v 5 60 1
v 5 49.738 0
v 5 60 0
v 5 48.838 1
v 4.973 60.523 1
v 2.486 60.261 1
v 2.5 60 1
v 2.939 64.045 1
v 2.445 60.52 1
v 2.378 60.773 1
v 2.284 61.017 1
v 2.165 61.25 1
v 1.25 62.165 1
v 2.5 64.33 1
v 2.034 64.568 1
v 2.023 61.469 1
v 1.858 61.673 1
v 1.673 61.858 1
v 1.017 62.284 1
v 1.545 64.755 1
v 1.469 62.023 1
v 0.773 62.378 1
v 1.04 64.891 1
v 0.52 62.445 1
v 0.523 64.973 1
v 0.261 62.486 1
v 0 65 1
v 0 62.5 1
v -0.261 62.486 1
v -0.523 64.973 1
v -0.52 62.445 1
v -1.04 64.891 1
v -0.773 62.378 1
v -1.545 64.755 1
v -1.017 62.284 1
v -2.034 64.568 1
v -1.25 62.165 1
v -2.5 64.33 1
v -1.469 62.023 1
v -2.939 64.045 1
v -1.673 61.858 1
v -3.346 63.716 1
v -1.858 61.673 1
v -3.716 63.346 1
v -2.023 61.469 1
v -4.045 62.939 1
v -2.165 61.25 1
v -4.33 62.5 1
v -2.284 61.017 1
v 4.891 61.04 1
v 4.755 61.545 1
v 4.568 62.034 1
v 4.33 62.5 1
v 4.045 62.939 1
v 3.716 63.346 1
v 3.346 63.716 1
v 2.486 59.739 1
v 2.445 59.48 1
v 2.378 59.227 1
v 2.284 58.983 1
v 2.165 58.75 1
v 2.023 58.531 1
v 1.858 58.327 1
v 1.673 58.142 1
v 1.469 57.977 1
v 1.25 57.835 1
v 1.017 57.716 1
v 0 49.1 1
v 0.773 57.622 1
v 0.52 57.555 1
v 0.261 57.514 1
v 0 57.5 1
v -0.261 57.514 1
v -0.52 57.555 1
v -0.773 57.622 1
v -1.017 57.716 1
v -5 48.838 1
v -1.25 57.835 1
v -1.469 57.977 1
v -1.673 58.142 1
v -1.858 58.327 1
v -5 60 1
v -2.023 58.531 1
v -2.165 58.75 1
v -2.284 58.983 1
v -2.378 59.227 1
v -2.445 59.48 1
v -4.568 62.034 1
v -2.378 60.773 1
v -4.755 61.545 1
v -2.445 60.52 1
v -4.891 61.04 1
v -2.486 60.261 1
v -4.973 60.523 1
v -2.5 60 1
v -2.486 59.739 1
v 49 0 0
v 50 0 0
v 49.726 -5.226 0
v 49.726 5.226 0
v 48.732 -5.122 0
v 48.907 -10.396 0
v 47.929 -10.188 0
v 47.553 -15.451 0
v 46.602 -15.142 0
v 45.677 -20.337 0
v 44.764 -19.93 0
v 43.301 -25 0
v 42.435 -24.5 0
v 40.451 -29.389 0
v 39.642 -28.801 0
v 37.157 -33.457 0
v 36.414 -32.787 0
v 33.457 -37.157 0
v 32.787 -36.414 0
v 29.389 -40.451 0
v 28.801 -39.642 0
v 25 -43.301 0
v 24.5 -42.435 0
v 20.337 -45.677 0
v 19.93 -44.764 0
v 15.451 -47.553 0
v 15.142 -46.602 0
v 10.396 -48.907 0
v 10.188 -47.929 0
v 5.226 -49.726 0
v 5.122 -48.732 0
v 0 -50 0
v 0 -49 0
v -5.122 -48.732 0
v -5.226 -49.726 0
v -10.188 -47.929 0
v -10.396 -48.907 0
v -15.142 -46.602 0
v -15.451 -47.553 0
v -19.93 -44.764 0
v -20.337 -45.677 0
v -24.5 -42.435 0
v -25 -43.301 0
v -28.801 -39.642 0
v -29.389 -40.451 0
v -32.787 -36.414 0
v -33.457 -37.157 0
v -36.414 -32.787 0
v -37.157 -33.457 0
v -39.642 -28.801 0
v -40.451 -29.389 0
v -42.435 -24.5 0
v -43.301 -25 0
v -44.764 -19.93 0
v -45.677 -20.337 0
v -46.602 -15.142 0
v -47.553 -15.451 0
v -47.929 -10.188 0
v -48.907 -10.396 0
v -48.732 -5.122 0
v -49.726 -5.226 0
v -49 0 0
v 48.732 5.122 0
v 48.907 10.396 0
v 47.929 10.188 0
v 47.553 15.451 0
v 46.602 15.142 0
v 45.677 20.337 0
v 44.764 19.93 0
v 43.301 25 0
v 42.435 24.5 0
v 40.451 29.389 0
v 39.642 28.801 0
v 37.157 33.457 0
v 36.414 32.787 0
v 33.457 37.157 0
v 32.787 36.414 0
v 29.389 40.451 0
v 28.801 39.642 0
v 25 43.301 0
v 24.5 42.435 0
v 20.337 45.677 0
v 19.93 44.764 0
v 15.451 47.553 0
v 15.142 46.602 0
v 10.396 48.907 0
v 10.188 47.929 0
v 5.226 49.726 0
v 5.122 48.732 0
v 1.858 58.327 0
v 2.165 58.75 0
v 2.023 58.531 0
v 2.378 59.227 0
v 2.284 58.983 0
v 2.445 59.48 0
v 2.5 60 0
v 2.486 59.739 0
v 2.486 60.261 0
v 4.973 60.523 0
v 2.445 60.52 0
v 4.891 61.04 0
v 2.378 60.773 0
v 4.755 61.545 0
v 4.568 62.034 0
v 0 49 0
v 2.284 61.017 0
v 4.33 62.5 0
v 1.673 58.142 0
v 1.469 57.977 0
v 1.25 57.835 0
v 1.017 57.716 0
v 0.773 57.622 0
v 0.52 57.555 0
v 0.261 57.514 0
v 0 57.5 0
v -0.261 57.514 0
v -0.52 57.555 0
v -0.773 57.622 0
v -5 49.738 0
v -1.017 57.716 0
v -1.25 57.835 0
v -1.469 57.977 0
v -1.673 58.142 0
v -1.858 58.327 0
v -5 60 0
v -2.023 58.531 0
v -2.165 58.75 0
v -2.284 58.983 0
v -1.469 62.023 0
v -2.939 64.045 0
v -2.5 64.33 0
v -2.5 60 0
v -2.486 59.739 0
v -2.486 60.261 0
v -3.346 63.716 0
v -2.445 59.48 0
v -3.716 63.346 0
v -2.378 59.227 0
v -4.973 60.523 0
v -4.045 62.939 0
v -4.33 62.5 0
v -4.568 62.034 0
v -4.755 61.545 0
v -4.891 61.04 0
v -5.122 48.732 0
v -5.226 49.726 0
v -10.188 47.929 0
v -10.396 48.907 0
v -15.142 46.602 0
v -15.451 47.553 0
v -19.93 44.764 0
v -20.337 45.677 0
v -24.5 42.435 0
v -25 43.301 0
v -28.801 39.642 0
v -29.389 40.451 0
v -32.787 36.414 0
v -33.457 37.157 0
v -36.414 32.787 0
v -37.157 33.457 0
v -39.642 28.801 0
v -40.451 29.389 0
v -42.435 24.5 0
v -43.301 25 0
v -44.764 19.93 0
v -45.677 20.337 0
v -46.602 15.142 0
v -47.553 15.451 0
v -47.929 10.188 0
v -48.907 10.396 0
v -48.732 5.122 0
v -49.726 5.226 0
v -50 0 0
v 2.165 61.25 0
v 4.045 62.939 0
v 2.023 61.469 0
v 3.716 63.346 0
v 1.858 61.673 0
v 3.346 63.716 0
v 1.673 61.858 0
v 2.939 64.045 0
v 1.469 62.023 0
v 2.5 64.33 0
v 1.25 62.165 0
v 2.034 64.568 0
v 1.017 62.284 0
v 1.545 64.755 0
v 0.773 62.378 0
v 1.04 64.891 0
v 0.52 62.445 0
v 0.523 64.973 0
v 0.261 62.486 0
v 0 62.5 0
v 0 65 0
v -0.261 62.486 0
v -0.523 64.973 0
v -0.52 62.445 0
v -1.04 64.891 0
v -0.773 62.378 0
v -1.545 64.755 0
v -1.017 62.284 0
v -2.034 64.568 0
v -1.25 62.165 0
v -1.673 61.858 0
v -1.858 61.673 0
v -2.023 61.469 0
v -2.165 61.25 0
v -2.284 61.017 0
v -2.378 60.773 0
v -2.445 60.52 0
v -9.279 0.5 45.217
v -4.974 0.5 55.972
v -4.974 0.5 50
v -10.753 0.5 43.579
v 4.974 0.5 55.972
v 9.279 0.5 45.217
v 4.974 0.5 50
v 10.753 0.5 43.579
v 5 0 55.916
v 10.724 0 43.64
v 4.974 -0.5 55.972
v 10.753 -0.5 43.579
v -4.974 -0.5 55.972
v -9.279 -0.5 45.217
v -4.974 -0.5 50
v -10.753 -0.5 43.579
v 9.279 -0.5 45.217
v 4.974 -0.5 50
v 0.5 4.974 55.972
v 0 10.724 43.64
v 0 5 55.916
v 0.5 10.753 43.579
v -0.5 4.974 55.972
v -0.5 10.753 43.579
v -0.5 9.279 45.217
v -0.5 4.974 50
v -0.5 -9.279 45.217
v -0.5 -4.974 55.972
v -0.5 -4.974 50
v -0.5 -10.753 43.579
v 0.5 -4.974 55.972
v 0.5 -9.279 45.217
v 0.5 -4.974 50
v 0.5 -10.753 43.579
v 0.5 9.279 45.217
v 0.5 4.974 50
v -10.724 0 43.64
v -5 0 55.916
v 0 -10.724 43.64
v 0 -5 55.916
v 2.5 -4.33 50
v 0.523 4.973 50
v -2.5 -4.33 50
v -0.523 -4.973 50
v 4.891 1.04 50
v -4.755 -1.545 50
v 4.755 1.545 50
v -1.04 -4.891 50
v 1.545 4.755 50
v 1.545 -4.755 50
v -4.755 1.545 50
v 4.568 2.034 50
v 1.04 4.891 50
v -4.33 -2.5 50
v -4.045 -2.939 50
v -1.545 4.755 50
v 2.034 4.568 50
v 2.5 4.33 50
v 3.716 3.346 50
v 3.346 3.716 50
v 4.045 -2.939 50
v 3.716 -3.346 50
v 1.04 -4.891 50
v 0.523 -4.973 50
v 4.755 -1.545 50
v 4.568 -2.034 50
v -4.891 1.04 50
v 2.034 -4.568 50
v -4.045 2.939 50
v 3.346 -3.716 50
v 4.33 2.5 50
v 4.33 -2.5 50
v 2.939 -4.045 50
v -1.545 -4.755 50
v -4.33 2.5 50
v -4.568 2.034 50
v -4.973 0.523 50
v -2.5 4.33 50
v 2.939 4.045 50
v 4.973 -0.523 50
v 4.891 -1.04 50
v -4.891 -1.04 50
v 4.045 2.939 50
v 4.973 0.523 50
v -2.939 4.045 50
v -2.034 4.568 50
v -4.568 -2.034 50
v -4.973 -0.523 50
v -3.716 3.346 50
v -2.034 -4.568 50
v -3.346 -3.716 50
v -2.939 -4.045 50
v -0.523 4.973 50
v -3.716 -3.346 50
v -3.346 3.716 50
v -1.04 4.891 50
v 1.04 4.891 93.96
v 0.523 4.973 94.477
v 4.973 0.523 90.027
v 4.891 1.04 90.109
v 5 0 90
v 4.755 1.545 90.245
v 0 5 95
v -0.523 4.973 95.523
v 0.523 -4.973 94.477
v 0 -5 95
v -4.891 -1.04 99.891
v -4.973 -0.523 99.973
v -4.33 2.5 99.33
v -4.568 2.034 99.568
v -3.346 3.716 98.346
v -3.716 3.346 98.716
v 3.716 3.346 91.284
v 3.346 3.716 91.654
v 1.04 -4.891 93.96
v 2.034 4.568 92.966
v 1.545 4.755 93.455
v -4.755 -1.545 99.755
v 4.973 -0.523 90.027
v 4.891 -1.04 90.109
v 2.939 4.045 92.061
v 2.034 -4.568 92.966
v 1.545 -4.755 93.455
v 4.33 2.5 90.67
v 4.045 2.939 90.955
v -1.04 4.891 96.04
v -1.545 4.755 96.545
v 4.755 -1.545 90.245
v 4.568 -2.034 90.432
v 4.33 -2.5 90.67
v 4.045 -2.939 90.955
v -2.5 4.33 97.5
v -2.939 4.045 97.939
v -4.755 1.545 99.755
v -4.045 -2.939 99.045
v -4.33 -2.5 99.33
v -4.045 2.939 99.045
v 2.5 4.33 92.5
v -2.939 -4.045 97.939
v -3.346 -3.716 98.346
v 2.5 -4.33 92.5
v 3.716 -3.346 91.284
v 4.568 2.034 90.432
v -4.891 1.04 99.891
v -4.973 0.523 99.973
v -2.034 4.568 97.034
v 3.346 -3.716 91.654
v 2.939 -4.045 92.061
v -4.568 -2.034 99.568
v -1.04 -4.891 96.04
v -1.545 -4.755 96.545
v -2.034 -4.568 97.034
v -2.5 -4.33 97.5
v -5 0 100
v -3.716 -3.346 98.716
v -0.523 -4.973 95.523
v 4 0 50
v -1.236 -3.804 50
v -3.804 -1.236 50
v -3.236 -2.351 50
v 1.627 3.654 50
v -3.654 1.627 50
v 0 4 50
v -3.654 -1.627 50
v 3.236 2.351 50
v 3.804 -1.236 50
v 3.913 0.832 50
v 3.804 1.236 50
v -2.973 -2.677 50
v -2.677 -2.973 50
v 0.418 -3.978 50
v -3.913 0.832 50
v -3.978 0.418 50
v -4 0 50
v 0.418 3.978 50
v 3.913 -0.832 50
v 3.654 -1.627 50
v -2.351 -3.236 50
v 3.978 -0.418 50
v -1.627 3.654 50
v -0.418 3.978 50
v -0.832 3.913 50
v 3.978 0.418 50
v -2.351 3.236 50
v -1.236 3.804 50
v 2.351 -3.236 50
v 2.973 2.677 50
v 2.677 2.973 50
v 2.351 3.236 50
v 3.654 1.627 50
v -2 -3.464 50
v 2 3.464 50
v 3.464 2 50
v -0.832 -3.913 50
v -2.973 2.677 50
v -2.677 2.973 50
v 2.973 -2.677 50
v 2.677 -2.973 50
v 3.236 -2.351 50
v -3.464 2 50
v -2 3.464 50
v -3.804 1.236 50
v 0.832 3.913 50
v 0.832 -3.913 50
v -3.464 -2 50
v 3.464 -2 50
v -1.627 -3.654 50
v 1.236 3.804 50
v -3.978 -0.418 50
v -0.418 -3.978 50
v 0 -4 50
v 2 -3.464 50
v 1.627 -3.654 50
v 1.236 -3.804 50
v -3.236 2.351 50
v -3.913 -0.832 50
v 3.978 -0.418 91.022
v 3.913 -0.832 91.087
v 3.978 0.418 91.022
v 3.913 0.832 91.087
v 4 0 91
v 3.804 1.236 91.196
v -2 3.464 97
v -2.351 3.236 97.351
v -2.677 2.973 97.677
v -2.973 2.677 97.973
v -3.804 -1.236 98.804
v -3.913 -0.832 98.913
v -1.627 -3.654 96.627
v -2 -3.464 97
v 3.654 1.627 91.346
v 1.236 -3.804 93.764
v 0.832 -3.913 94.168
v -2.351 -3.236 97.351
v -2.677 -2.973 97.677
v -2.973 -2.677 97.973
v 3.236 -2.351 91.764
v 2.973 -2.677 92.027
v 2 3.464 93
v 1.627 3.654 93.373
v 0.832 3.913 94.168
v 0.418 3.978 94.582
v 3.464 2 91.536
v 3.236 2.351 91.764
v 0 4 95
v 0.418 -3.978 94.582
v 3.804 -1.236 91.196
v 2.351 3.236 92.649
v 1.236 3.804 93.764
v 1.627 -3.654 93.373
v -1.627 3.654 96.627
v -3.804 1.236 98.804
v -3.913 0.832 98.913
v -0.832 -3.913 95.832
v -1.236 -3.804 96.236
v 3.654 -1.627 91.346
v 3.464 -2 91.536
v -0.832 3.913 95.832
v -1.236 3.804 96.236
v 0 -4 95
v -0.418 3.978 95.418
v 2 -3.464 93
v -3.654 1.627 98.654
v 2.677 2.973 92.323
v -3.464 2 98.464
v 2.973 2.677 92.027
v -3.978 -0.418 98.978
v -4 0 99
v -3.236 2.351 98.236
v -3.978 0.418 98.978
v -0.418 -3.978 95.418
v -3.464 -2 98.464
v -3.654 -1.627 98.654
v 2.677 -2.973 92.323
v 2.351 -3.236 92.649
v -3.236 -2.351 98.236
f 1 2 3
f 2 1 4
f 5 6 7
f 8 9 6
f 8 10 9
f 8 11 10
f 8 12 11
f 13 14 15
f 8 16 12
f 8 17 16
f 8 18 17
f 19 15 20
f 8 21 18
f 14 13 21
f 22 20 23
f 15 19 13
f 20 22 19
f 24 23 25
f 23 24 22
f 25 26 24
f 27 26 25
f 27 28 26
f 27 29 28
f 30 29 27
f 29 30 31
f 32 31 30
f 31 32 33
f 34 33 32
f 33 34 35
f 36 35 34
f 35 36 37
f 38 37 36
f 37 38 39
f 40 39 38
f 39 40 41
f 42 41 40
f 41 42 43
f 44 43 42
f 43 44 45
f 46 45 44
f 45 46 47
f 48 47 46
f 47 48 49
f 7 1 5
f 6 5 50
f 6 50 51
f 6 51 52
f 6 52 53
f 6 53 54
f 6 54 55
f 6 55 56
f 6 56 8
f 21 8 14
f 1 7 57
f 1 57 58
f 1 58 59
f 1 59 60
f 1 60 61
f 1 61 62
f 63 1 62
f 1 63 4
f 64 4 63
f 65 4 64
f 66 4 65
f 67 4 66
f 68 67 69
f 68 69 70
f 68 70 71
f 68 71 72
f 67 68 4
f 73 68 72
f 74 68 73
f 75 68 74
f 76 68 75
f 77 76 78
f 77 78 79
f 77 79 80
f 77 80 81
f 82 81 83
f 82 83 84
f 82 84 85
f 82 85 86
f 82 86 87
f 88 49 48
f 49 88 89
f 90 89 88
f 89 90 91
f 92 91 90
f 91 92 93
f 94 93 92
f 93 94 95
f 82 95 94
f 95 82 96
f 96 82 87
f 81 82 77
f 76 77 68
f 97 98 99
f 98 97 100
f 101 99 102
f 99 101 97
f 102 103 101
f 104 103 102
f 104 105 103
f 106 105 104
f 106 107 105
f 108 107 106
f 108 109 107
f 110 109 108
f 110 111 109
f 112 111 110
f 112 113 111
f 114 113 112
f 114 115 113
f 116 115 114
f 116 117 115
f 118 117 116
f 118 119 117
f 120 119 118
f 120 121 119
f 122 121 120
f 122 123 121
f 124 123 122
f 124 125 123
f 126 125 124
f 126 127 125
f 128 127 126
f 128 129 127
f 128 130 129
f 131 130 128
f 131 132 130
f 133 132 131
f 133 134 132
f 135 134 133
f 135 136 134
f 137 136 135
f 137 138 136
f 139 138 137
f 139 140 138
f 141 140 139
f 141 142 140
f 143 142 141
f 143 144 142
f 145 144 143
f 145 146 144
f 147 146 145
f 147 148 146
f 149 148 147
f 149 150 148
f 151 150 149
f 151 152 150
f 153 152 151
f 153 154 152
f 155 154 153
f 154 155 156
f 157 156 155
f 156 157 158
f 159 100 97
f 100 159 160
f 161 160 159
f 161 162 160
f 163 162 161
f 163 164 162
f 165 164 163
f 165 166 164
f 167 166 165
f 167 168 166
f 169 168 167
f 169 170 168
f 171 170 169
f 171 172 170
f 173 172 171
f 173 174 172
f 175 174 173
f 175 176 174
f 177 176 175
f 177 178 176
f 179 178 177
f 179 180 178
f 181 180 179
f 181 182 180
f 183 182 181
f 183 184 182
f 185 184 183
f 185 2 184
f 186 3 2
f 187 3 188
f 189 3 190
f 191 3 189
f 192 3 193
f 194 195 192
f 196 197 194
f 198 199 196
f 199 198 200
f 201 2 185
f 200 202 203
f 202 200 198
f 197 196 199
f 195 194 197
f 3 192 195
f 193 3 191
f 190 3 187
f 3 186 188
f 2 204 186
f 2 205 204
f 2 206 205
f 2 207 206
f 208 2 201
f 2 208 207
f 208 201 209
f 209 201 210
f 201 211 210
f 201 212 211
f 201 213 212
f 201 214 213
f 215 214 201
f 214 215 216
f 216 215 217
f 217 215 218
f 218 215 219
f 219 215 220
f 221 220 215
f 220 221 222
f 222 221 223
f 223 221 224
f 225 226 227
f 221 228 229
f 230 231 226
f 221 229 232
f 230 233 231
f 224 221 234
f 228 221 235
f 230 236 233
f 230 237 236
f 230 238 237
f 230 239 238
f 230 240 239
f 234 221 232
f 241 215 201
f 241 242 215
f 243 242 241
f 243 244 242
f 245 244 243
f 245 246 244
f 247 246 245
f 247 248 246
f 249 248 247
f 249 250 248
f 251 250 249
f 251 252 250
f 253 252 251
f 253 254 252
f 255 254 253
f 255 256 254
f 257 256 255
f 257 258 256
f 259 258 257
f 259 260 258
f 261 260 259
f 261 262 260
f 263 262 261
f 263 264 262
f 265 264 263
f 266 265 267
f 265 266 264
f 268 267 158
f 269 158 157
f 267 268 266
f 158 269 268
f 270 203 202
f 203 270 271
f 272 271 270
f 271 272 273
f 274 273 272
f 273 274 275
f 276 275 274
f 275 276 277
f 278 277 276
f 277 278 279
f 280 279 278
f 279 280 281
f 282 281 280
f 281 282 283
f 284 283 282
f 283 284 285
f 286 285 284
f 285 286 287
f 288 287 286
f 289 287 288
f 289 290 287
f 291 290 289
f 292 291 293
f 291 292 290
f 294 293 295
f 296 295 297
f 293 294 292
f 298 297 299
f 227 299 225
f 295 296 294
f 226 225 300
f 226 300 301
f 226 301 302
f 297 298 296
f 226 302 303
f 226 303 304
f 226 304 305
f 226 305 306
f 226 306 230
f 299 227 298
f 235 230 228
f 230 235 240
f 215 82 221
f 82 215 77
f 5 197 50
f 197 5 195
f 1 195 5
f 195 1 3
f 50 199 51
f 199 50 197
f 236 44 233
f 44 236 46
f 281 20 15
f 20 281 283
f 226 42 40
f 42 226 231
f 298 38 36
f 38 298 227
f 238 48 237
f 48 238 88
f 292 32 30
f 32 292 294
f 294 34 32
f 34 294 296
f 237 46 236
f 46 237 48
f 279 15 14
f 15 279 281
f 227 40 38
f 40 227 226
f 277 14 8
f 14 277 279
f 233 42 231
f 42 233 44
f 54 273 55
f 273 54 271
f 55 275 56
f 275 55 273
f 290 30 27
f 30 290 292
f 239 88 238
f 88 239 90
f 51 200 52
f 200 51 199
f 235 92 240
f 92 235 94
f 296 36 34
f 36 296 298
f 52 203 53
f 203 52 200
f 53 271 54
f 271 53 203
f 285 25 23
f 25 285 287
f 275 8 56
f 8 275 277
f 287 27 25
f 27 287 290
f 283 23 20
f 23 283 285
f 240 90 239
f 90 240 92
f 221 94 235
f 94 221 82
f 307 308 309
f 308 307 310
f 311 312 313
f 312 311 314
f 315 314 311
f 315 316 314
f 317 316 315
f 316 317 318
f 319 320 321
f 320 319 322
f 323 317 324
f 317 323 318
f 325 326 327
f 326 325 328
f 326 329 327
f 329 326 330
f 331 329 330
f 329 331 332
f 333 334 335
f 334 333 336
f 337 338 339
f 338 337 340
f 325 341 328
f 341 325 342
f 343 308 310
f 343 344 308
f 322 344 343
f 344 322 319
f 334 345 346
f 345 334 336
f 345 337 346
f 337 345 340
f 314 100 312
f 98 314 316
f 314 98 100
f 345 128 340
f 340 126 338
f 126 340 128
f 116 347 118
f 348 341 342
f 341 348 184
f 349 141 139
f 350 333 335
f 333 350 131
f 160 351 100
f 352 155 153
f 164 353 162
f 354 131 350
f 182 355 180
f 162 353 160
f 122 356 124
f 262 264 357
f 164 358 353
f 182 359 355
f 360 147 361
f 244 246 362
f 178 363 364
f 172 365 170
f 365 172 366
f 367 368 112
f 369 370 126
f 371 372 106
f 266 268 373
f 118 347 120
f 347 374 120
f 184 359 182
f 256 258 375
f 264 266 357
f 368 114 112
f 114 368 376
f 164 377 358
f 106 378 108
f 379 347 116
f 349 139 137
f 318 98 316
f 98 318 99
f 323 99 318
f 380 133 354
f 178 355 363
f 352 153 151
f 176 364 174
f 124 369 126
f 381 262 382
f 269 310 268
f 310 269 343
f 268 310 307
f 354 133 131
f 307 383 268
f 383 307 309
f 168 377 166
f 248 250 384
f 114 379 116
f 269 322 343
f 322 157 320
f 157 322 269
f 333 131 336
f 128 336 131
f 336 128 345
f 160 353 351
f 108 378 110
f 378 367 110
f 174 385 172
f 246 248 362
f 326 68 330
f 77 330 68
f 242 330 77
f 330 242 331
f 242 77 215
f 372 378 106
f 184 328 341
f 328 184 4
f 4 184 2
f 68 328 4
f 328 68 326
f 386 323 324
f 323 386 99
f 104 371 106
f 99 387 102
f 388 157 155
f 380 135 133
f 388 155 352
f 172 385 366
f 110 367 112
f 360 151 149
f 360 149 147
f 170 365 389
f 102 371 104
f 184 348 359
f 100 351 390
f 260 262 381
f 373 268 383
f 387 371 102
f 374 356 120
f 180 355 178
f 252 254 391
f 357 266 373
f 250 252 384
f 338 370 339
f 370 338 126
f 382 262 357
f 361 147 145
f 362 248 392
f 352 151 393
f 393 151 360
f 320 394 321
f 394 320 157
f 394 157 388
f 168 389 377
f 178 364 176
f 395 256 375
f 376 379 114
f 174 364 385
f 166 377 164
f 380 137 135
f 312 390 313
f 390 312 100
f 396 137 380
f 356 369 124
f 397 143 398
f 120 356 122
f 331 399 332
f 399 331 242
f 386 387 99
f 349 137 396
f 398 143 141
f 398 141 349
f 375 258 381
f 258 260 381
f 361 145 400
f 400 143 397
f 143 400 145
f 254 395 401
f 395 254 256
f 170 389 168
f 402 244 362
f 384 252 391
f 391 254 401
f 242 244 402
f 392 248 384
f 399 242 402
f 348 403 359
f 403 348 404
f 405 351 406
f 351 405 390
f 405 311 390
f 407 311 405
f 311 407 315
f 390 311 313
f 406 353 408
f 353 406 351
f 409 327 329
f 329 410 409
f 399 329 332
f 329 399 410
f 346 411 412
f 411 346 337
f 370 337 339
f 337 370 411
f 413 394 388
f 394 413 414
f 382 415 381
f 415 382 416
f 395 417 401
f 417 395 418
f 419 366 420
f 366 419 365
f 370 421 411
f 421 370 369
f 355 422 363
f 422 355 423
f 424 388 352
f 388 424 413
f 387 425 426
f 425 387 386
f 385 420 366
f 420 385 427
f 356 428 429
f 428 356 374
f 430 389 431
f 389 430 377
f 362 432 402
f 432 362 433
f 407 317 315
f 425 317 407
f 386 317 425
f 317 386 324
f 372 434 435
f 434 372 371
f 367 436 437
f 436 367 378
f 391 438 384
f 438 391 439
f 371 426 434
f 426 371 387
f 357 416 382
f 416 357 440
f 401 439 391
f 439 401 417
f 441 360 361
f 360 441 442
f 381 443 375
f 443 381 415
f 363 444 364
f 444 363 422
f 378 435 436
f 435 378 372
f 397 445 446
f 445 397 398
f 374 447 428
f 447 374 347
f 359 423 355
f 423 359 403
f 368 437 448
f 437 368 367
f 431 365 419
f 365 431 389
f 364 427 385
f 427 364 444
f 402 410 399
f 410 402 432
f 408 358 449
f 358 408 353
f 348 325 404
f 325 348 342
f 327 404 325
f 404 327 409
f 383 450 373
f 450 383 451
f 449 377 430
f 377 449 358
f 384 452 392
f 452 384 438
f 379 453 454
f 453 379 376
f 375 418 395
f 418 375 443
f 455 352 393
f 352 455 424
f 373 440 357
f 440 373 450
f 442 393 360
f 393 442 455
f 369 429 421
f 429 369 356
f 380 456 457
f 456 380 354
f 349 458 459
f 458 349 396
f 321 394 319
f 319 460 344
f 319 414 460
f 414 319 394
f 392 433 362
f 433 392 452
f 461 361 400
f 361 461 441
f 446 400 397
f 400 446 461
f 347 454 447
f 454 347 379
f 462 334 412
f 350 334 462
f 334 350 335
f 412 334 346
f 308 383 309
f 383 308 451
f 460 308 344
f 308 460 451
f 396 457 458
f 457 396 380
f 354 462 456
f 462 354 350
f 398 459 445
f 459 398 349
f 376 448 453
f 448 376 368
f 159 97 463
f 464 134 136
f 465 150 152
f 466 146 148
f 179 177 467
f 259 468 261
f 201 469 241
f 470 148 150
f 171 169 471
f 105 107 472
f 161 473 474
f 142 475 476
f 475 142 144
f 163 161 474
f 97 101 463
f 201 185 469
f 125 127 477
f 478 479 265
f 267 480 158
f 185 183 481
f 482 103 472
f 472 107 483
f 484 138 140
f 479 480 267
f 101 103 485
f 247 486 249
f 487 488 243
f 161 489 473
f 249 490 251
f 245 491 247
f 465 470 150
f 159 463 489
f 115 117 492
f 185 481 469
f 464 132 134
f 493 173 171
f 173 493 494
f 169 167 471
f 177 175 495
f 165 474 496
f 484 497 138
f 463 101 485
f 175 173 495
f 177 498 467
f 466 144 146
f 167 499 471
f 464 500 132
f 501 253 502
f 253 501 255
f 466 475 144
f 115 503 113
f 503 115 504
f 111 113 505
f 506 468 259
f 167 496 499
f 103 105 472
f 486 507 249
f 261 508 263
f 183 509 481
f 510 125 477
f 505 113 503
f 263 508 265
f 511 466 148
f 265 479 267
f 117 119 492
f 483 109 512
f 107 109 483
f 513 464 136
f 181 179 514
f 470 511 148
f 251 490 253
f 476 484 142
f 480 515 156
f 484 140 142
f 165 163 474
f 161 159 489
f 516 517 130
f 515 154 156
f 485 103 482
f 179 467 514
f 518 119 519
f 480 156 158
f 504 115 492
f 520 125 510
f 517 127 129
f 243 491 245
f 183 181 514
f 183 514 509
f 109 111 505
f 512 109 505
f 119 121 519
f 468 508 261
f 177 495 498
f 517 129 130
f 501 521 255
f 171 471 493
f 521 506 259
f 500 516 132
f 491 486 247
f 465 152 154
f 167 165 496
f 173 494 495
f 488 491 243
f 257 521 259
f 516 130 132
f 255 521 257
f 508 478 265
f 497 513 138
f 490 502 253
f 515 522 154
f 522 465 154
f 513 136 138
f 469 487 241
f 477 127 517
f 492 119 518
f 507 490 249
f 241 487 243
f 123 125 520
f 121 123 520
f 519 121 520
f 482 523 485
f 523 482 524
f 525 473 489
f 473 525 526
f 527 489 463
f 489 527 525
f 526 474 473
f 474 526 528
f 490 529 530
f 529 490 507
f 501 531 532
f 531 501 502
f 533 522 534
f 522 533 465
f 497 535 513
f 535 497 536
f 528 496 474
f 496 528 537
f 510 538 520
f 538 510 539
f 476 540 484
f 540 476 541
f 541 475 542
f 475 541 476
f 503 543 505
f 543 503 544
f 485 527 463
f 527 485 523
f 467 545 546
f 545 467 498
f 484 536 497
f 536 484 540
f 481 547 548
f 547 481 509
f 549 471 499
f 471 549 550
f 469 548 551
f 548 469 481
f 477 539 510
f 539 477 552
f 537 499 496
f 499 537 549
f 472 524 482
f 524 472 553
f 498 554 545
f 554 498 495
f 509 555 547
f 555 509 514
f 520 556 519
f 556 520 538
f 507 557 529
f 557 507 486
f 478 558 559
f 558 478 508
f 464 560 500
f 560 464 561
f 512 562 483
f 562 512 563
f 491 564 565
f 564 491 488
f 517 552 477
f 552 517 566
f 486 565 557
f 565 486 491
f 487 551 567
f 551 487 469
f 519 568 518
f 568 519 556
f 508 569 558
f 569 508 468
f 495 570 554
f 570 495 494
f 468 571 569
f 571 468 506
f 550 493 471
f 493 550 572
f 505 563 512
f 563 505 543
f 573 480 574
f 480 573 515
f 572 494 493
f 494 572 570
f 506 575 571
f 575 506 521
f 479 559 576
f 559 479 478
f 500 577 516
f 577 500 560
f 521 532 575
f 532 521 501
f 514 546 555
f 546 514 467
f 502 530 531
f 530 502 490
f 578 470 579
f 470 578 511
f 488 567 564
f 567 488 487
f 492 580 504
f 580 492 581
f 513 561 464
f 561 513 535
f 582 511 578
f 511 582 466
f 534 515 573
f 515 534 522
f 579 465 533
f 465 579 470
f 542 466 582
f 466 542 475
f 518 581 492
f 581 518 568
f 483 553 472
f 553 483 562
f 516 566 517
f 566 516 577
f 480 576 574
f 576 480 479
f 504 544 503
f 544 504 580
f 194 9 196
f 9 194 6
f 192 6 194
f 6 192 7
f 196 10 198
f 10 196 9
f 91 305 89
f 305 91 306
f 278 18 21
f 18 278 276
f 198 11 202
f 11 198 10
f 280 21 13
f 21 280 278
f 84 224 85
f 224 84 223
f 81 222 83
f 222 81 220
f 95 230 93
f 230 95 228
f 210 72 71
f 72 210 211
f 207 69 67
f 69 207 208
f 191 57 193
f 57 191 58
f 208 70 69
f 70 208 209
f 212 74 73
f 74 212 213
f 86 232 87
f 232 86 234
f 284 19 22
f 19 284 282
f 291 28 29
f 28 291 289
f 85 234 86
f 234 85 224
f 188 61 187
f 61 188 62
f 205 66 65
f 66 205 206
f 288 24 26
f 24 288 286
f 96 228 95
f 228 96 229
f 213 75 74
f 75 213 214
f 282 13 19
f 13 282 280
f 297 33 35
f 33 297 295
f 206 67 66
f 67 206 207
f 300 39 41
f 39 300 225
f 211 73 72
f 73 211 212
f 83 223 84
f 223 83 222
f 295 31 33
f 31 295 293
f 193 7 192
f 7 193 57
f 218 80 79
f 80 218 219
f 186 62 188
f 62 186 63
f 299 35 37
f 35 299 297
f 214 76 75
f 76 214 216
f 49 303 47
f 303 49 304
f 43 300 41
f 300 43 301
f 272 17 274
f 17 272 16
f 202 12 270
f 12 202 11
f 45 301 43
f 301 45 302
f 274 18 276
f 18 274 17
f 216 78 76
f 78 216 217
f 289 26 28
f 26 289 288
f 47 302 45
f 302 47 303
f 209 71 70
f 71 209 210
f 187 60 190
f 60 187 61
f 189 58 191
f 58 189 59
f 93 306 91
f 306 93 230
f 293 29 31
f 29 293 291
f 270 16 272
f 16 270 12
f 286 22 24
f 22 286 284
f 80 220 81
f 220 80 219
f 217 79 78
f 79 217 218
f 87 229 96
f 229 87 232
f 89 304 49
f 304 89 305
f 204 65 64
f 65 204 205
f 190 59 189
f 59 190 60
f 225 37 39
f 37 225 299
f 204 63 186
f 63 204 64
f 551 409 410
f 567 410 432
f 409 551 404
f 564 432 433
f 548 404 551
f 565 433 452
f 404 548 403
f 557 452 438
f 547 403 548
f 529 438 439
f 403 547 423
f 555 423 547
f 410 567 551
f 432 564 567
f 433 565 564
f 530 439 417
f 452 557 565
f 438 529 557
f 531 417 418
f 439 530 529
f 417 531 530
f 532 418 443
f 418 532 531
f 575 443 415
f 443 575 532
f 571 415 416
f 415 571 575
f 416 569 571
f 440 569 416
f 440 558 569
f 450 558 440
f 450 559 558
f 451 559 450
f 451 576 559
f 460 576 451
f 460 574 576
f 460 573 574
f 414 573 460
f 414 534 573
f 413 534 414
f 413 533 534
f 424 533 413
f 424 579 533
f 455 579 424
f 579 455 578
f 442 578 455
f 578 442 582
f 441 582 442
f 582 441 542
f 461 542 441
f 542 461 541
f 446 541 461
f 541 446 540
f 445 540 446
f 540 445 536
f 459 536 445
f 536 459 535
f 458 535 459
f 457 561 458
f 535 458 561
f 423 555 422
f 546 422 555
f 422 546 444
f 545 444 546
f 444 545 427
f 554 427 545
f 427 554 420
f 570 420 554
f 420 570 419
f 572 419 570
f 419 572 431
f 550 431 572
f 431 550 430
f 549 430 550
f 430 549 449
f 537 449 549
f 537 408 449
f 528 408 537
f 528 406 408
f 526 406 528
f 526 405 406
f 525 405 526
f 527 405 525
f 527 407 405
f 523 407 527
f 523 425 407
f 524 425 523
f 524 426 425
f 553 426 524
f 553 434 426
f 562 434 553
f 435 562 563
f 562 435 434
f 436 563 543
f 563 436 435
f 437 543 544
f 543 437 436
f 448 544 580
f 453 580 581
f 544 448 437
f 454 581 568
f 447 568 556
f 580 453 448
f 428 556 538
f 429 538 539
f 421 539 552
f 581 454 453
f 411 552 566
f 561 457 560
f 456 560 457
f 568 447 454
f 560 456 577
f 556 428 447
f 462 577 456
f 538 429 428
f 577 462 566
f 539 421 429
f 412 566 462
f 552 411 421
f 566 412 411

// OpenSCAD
/* [Funnel] */

fine = 60; // [20:100]
show_Hanger = "yes"; // [yes,no]
show_Gab = "yes"; // [yes,no]
WallThickness = 1; // [1:3]

// Which one would you like to see?




HighFunnel =50; // [30:150]
DiameterTop = 100; // [40:150]



DiameterPipe = 10; // [6:20]
HighPipe =50; // [30:80]
BeveledTip = "yes"; // [yes,no]

// ignore variable values

/* [Hidden] */
Spitze = 45;

$fn = fine;
Hoehe = (HighPipe + HighFunnel) / 2;
Ghoehe = (HighPipe + HighFunnel);
ra2 = DiameterPipe/2;

schr=ra2*5;

ra1 = DiameterTop;
Wand = WallThickness;

Hy = (ra2*2)/cos(Spitze);
LuftW = 110 - atan((ra1/2)/HighFunnel);
echo (LuftW);

difference()
{
union() {
//Trichter    
    translate([0,0,HighFunnel/2])
    cylinder(r1=ra1/2,r2=ra2,h=HighFunnel, center = true);

//Lasche
if (show_Hanger=="yes"){    
    translate([0,ra1/2,Wand/2])
    cube(size = [ra1/10,ra1/5,Wand], center = true);    
    translate([0,ra1/2+ra1/10,Wand/2])
    cylinder(r=ra1/20,h=Wand, center = true); 
} 

//Rohr 

    translate([0,0,Ghoehe-(HighPipe/2)])
    cylinder(r=ra2,h=HighPipe, center = true);  
  
//Gab
if (show_Gab=="yes"){ 
    translate([ra2,0,HighFunnel])
    rotate(a=[0,LuftW,0])
    cube(size = [Hoehe/(1/ra2/.1),Wand,ra2], center = true);

    translate([0,ra2,HighFunnel])
    rotate(a=[0,LuftW,90])
    cube(size = [Hoehe/(1/ra2/.1),Wand,ra2], center = true);
  
    translate([-ra2,0,HighFunnel])
    rotate(a=[0,LuftW,180])
    cube(size = [Hoehe/(1/ra2/.1),Wand,ra2], center = true);
  
    translate([0,-ra2,HighFunnel])
    rotate(a=[0,LuftW,270])
    cube(size = [Hoehe/(1/ra2/.1),Wand,ra2], center = true);  
} 
}

//Loch Trichter
    translate([0,0,HighFunnel/2])
    cylinder(r1=ra1/2-Wand,r2=ra2-Wand,h=HighFunnel, center = true);
// Loch Rohr
    translate([0,0,Ghoehe-(HighPipe/2)])
    cylinder(r=ra2-Wand,h=Hoehe, center = true);

// Loch in der Lasche
if (show_Hanger=="yes"){
    translate([0,ra1/2+ra1/10,Wand/2])
    cylinder(r=ra1/40,h=Wand, center = true);
}

//Spitze
if (BeveledTip=="yes"){
    
    translate([ra2*1,0,(HighPipe + HighFunnel)])
    rotate(a=[0,Spitze,0])
    cube(size = [Hy*1.0,ra2*2,Hy*1.0], center = true);
}
}
